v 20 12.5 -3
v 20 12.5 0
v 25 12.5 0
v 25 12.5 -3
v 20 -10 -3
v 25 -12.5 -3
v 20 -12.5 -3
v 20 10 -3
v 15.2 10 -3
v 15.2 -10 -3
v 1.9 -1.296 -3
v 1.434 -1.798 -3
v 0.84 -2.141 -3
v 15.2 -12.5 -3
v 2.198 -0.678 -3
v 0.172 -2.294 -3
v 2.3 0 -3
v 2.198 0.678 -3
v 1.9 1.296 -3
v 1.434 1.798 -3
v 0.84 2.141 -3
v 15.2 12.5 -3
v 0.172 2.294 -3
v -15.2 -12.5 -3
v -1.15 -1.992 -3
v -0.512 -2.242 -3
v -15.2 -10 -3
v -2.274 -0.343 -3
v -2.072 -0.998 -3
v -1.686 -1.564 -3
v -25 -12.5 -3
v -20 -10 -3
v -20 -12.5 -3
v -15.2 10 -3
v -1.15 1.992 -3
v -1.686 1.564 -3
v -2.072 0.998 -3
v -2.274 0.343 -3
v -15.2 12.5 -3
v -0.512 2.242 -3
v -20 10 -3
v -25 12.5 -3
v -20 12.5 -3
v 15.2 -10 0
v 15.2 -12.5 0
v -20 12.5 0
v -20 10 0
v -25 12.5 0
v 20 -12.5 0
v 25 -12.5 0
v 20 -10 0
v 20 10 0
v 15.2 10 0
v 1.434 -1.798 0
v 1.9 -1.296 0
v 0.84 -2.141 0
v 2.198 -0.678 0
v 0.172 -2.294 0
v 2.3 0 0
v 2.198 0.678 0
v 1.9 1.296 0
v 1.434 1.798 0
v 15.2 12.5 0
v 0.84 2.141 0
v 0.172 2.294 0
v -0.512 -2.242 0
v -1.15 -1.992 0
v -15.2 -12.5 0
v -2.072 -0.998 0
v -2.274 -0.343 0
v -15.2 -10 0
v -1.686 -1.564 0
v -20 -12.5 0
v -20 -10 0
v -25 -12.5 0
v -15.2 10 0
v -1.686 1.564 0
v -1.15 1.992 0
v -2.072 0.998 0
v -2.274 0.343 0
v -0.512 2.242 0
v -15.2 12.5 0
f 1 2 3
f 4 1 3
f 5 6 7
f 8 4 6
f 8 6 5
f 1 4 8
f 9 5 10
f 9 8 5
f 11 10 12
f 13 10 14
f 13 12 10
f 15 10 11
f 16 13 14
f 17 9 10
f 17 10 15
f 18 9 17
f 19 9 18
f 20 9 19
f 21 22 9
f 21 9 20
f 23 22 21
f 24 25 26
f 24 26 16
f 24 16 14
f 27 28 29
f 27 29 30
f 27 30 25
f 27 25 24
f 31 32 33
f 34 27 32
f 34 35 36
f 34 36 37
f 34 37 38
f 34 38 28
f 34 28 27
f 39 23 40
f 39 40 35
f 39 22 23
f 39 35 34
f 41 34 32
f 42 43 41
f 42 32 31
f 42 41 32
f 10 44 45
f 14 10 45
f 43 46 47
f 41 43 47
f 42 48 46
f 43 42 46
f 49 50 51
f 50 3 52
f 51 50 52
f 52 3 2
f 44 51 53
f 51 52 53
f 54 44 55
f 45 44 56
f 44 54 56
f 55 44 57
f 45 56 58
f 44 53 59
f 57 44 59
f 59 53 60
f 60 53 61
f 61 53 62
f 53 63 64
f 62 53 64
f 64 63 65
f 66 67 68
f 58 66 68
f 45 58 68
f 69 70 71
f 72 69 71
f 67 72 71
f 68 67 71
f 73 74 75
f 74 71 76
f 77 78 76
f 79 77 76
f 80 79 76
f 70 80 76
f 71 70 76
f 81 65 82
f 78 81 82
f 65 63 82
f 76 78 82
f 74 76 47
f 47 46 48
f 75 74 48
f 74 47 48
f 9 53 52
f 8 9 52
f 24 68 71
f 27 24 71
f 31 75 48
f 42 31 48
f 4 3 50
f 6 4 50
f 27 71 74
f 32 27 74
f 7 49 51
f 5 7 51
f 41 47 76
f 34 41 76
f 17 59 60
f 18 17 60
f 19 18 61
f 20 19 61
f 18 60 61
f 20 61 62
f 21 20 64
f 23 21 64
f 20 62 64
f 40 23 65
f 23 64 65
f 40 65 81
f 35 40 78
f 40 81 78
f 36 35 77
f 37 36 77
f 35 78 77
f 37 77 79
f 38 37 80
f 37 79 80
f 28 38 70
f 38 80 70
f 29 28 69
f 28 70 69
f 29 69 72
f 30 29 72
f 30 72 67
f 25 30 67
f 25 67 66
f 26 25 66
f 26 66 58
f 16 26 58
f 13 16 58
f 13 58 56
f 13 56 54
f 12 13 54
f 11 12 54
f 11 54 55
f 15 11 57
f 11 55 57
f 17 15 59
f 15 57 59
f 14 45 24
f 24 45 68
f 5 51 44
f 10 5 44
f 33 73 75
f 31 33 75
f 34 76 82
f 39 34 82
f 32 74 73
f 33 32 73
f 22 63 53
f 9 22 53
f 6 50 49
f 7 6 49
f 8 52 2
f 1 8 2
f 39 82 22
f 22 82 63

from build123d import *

# Parameters (mm, degrees)
BOSS_EXTRUDE1_DEPTH = 3
SKETCH2_R           = 2.3
CUT_EXTRUDE1_DEPTH  = 3


with BuildPart() as part:
    # Sketch1 → Boss-Extrude1 (new body)
    with BuildSketch(Plane.XY):
        Polygon((-20, 12.5), (-20, 10), (-15.2, 10), (-15.2, 12.5), (15.2, 12.5), (15.2, 10), (20, 10), (20, 12.5), (25, 12.5), (25, -12.5), (20, -12.5), (20, -10), (15.2, -10), (15.2, -12.5), (-15.2, -12.5), (-15.2, -10), (-20, -10), (-20, -12.5), (-25, -12.5), (-25, 12.5), align=None)
    extrude(amount=-BOSS_EXTRUDE1_DEPTH)

    # Sketch2 → Cut-Extrude1 (cut)
    with BuildSketch(Plane.XY):
        Circle(SKETCH2_R)
    extrude(amount=-CUT_EXTRUDE1_DEPTH, mode=Mode.SUBTRACT)


solid = part.part
